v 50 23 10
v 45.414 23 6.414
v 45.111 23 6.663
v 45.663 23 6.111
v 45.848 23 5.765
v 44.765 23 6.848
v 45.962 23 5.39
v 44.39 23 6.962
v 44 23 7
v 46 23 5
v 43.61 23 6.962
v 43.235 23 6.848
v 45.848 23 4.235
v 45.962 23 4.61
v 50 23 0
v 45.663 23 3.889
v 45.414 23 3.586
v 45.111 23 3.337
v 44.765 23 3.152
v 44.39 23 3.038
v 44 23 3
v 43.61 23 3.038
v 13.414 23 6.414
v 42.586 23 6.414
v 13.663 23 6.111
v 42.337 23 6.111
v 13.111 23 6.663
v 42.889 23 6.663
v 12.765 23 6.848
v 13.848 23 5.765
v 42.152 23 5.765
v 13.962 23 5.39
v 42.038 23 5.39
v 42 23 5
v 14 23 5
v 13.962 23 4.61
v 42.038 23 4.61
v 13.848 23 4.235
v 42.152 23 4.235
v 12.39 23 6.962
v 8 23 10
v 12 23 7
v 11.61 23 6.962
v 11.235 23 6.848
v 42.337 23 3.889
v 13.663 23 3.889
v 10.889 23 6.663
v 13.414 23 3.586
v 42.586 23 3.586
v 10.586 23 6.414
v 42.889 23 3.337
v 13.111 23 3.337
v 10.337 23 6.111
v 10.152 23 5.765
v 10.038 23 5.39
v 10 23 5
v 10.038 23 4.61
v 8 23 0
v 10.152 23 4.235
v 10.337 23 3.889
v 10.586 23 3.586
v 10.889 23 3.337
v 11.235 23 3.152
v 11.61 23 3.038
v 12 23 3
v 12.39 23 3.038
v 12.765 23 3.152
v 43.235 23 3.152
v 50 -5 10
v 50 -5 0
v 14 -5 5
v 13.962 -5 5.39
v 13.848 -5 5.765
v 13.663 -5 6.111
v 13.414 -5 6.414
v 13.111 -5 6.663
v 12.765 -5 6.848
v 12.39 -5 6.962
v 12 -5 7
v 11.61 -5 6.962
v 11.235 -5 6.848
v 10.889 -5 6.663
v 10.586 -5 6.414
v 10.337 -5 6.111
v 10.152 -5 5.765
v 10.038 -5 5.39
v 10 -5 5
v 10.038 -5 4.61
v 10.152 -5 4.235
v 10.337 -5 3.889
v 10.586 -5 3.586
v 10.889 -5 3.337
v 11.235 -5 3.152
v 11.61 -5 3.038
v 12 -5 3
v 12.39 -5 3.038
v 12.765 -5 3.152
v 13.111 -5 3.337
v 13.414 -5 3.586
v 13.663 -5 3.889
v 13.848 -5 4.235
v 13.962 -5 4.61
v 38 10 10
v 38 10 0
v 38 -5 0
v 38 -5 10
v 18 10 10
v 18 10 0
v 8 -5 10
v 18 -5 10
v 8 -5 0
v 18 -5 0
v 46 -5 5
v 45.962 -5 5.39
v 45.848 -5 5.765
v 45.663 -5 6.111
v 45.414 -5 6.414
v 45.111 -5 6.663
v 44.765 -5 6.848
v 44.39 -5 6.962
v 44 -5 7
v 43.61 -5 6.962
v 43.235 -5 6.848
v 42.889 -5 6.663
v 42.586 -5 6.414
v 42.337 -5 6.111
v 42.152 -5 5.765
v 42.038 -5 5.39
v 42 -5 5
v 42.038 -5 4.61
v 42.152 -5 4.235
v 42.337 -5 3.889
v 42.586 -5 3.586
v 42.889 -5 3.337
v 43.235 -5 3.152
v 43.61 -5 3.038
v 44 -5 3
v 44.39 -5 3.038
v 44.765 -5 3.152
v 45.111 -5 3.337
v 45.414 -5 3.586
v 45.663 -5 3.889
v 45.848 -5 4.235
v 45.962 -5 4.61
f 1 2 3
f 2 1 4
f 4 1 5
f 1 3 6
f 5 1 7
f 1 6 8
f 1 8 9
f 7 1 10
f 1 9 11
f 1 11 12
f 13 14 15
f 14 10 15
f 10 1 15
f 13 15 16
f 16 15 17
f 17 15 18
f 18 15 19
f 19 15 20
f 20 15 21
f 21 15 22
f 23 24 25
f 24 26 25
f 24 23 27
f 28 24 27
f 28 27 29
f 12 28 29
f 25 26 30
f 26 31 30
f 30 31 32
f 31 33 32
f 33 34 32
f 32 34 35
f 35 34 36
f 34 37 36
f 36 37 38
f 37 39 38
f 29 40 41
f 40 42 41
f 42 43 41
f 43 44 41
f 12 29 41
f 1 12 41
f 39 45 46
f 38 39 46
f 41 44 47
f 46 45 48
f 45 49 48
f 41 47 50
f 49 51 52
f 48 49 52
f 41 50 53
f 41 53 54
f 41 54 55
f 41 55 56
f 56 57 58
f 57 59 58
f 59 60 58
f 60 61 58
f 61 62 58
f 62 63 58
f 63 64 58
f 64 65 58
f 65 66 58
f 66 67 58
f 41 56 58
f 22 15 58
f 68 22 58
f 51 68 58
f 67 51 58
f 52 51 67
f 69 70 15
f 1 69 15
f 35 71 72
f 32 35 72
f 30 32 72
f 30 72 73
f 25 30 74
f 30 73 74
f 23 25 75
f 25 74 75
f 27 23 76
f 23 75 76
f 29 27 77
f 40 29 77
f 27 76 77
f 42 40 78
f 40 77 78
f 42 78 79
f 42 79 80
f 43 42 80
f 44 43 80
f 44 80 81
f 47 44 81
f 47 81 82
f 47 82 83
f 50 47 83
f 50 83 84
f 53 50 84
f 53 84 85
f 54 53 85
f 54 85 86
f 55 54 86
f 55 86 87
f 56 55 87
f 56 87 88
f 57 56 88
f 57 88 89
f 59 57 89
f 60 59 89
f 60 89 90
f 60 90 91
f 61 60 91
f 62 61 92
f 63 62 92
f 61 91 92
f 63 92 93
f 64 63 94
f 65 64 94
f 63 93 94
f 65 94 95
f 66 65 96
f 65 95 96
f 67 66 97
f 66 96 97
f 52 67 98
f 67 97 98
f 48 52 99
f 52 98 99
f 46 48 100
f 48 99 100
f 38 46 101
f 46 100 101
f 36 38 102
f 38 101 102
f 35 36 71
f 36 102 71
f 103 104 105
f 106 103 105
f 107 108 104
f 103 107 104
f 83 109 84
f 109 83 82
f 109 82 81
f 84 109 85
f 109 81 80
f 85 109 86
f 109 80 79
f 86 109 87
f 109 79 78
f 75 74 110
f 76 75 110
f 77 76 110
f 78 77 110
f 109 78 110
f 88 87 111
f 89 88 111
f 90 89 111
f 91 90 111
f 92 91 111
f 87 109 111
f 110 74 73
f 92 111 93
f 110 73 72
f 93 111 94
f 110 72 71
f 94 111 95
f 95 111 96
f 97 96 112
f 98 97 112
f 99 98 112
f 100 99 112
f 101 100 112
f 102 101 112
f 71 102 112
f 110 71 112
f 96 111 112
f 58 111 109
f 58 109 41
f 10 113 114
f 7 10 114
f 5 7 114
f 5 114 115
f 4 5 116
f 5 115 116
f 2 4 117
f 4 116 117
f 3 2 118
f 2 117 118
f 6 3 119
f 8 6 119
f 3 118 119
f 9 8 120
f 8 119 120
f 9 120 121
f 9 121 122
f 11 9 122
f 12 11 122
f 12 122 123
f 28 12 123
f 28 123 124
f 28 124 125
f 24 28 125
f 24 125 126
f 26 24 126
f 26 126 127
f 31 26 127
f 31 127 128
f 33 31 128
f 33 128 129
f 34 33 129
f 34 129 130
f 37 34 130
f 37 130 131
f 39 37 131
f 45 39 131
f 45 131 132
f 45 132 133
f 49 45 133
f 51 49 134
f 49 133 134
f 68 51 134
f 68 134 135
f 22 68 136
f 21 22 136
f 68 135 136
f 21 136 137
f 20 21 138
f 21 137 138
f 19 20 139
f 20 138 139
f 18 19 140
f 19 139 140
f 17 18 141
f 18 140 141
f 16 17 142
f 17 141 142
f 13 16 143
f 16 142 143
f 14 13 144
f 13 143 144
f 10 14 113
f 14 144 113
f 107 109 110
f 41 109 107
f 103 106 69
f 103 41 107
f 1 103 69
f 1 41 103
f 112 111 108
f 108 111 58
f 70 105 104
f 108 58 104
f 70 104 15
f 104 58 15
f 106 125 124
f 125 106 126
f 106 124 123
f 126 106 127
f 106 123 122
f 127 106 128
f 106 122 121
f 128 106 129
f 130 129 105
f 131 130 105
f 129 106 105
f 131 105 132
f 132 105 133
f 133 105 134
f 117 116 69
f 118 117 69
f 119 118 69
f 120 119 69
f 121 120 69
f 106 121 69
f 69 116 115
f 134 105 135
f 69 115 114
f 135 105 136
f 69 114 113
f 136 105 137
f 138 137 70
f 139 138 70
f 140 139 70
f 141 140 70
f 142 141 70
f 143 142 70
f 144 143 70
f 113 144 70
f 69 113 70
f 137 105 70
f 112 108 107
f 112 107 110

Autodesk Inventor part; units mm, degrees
ref_plane "YZ Plane" through (0, 0, 0) normal (1, 0, 0) x (0, 1, 0)
ref_plane "XZ Plane" through (0, 0, 0) normal (0, 1, 0) x (-1, 0, 0)
ref_plane "XY Plane" through (0, 0, 0) normal (0, 0, 1) x (1, 0, 0)
sketch "Sketch1" plane through (0, 0, 0) normal (0, 0, 1) x (1, 0, 0)
  line L0 (50, -5) -> (50, 23)
  line L1 (50, 23) -> (8, 23)
  line L2 (18, 10) -> (38, 10)
  line L3 (18, 10) -> (18, -5)
  line L4 (38, 10) -> (38, -5)
  line L5 (8, -5) -> (8, 23)
  line L6 (8, -5) -> (18, -5)
  line L7 (38, -5) -> (50, -5)
  dimension "d1" = 28
  dimension "d4" = 15
  dimension "d14" = 20
  dimension "d16" = 12
  dimension "d37" = 42
  dimension "d46" = 28
extrude "Extrusion3" add sketch "Sketch1" along normal blind 10
sketch "Sketch5" plane through (8, -5, 0) normal (0, -1, 0) x (1, 0, 0)
  circle A0 centre (4, 5) radius 2
  line L0 (10, 0) -> (10, 10) projected
  line L1 (0, 0) -> (10, 0) projected
  circle A1 centre (36, 5) radius 2
  line L2 (30, 0) -> (30, 10) projected
  line L3 (30, 0) -> (42, 0) projected
  dimension "d38" = 4
  dimension "d39" = 6
  dimension "d40" = 5
  dimension "d41" = 4
  dimension "d42" = 6
  dimension "d43" = 5
extrude "Extrusion6" cut sketch "Sketch5" against normal blind 100
properties part number "Espaciador Derecho" material "Aluminum 6061"
